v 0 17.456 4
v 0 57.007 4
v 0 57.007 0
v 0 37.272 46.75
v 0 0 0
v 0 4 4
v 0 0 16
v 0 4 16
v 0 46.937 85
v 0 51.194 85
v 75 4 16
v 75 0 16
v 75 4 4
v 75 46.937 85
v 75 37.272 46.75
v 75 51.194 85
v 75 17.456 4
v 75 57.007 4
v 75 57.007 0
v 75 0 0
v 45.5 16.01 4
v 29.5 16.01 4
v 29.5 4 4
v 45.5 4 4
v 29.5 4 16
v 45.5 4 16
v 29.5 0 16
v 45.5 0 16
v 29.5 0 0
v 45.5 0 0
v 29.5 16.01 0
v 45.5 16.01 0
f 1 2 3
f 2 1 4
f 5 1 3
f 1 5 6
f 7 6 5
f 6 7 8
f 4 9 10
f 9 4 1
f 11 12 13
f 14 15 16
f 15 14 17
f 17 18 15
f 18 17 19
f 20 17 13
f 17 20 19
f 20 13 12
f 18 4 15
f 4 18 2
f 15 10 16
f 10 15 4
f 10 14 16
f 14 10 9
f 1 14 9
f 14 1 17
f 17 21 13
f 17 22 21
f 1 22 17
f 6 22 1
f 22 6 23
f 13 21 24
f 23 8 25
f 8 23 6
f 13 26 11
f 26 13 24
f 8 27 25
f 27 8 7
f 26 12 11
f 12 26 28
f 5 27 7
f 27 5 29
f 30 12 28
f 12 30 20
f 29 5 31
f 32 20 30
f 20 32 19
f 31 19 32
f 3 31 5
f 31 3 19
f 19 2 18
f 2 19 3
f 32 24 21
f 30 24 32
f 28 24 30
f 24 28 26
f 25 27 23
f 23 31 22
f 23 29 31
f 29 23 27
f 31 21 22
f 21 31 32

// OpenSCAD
// Soporte de celular para escritorio — Forja3D (MIT)
// Se imprime tal cual, sin soportes. PLA o PETG, 3 paredes, 15 % de relleno.

/* [Celular] */
// Grosor del celular con funda (mm)
grosor_celular = 12; // [6:0.5:20]
// Ancho del soporte (mm)
ancho = 75; // [50:1:120]

/* [Soporte] */
// Inclinación del respaldo desde la vertical (grados)
angulo = 20; // [5:1:40]
// Altura del respaldo (mm)
alto_respaldo = 85; // [50:1:140]
// Altura del labio frontal que sujeta el celular (mm)
labio = 12; // [6:1:25]
// Grosor de las paredes (mm)
pared = 4; // [2.4:0.2:8]
// Hueco en el labio para el cable de carga
hueco_cable = true;
// Ancho del hueco para el cable (mm)
ancho_hueco = 16; // [8:1:30]

/* [Hidden] */
$fn = 64;
y_respaldo = pared + grosor_celular;
grosor_horizontal = pared / cos(angulo);
avance = alto_respaldo * tan(angulo);
profundidad = y_respaldo + grosor_horizontal + avance * 0.8 + 12;

module perfil() {
  union() {
    square([profundidad, pared]);                       // base
    square([pared, pared + labio]);                     // labio frontal
    polygon([                                            // respaldo inclinado
      [y_respaldo, 0],
      [y_respaldo + grosor_horizontal, 0],
      [y_respaldo + grosor_horizontal + avance, alto_respaldo],
      [y_respaldo + avance, alto_respaldo]
    ]);
    polygon([                                            // refuerzo trasero
      [y_respaldo + grosor_horizontal, 0],
      [y_respaldo + grosor_horizontal + avance * 0.55, alto_respaldo * 0.55],
      [profundidad, pared],
      [profundidad, 0]
    ]);
  }
}

module soporte() {
  difference() {
    // El perfil 2D (Y, Z) se extruye a lo largo de X
    rotate([90, 0, 90]) linear_extrude(ancho) perfil();
    if (hueco_cable)
      translate([(ancho - ancho_hueco) / 2, -1, -1])
        cube([ancho_hueco, y_respaldo + 1.01, pared + labio + 2]);
  }
}

soporte();
